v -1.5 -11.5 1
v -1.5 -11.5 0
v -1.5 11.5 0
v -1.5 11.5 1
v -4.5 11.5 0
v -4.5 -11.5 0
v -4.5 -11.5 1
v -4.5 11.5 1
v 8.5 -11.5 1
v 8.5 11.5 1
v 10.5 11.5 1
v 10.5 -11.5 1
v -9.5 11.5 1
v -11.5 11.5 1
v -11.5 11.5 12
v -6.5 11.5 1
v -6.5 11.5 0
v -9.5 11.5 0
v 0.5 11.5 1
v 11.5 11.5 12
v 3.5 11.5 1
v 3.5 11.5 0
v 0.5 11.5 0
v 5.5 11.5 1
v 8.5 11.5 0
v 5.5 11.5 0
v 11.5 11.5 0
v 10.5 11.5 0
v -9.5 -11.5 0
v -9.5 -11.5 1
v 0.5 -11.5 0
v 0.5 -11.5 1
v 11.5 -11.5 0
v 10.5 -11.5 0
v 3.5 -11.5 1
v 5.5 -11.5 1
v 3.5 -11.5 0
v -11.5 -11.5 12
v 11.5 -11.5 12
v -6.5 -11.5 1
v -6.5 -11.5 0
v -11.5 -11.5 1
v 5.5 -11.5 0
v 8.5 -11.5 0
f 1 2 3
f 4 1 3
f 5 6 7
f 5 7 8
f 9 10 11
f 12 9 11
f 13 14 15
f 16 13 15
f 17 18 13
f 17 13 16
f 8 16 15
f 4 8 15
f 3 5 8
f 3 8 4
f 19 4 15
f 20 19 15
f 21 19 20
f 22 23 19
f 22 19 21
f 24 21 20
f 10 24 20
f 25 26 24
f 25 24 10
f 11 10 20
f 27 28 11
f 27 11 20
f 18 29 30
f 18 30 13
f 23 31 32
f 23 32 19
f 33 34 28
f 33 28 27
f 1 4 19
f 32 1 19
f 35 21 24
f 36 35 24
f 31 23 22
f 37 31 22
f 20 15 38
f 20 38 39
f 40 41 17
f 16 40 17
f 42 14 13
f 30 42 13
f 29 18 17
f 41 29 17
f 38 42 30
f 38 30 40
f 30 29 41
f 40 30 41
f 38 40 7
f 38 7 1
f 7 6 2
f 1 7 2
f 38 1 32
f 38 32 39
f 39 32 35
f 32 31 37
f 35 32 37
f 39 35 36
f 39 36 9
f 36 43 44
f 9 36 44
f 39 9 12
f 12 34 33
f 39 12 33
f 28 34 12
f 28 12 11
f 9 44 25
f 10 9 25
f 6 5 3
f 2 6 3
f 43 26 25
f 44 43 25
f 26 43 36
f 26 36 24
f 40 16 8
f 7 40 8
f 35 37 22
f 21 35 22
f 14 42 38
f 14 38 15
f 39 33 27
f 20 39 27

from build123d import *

# Parameters (mm, degrees)
BOX015_W     = 2
BOX015_H     = 23
BOX015_DEPTH = 1
BOX014_W     = 2
BOX014_H     = 23
BOX014_DEPTH = 1
BOX013_W     = 2
BOX013_H     = 23
BOX013_DEPTH = 1
BOX012_W     = 2
BOX012_H     = 23
BOX012_DEPTH = 1
BOX016_W     = 2
BOX016_H     = 23
BOX016_DEPTH = 1
BOX011_W     = 23
BOX011_H     = 23
BOX011_DEPTH = 12


with BuildPart() as cube015:
    # Box015 → Box015 (new body)
    with BuildSketch(Plane(origin=(3.5, -11.5, 0), x_dir=(1, 0, 0), z_dir=(0, 0, 1))):
        with Locations((1, 11.5)):
            Rectangle(BOX015_W, BOX015_H)
    extrude(amount=BOX015_DEPTH)


with BuildPart() as cube014:
    # Box014 → Box014 (new body)
    with BuildSketch(Plane(origin=(-1.5, -11.5, 0), x_dir=(1, 0, 0), z_dir=(0, 0, 1))):
        with Locations((1, 11.5)):
            Rectangle(BOX014_W, BOX014_H)
    extrude(amount=BOX014_DEPTH)


with BuildPart() as cube013:
    # Box013 → Box013 (new body)
    with BuildSketch(Plane(origin=(-6.5, -11.5, 0), x_dir=(1, 0, 0), z_dir=(0, 0, 1))):
        with Locations((1, 11.5)):
            Rectangle(BOX013_W, BOX013_H)
    extrude(amount=BOX013_DEPTH)


with BuildPart() as cube012:
    # Box012 → Box012 (new body)
    with BuildSketch(Plane(origin=(-11.5, -11.5, 0), x_dir=(1, 0, 0), z_dir=(0, 0, 1))):
        with Locations((1, 11.5)):
            Rectangle(BOX012_W, BOX012_H)
    extrude(amount=BOX012_DEPTH)


with BuildPart() as fusion011:
    # Box016 → Box016 (new body)
    with BuildSketch(Plane(origin=(8.5, -11.5, 0), x_dir=(1, 0, 0), z_dir=(0, 0, 1))):
        with Locations((1, 11.5)):
            Rectangle(BOX016_W, BOX016_H)
    extrude(amount=BOX016_DEPTH)

    # Fusion011: union Cube015, Cube014, Cube013, Cube012
    add(cube015.part)
    add(cube014.part)
    add(cube013.part)
    add(cube012.part)


with BuildPart() as rubber_pad:
    # Box011 → Box011 (new body)
    with BuildSketch(Plane(origin=(-11.5, -11.5, 0), x_dir=(1, 0, 0), z_dir=(0, 0, 1))):
        with Locations((11.5, 11.5)):
            Rectangle(BOX011_W, BOX011_H)
    extrude(amount=BOX011_DEPTH)

    # Cut002002: cut Fusion011
    add(fusion011.part, mode=Mode.SUBTRACT)


solid = rubber_pad.part
